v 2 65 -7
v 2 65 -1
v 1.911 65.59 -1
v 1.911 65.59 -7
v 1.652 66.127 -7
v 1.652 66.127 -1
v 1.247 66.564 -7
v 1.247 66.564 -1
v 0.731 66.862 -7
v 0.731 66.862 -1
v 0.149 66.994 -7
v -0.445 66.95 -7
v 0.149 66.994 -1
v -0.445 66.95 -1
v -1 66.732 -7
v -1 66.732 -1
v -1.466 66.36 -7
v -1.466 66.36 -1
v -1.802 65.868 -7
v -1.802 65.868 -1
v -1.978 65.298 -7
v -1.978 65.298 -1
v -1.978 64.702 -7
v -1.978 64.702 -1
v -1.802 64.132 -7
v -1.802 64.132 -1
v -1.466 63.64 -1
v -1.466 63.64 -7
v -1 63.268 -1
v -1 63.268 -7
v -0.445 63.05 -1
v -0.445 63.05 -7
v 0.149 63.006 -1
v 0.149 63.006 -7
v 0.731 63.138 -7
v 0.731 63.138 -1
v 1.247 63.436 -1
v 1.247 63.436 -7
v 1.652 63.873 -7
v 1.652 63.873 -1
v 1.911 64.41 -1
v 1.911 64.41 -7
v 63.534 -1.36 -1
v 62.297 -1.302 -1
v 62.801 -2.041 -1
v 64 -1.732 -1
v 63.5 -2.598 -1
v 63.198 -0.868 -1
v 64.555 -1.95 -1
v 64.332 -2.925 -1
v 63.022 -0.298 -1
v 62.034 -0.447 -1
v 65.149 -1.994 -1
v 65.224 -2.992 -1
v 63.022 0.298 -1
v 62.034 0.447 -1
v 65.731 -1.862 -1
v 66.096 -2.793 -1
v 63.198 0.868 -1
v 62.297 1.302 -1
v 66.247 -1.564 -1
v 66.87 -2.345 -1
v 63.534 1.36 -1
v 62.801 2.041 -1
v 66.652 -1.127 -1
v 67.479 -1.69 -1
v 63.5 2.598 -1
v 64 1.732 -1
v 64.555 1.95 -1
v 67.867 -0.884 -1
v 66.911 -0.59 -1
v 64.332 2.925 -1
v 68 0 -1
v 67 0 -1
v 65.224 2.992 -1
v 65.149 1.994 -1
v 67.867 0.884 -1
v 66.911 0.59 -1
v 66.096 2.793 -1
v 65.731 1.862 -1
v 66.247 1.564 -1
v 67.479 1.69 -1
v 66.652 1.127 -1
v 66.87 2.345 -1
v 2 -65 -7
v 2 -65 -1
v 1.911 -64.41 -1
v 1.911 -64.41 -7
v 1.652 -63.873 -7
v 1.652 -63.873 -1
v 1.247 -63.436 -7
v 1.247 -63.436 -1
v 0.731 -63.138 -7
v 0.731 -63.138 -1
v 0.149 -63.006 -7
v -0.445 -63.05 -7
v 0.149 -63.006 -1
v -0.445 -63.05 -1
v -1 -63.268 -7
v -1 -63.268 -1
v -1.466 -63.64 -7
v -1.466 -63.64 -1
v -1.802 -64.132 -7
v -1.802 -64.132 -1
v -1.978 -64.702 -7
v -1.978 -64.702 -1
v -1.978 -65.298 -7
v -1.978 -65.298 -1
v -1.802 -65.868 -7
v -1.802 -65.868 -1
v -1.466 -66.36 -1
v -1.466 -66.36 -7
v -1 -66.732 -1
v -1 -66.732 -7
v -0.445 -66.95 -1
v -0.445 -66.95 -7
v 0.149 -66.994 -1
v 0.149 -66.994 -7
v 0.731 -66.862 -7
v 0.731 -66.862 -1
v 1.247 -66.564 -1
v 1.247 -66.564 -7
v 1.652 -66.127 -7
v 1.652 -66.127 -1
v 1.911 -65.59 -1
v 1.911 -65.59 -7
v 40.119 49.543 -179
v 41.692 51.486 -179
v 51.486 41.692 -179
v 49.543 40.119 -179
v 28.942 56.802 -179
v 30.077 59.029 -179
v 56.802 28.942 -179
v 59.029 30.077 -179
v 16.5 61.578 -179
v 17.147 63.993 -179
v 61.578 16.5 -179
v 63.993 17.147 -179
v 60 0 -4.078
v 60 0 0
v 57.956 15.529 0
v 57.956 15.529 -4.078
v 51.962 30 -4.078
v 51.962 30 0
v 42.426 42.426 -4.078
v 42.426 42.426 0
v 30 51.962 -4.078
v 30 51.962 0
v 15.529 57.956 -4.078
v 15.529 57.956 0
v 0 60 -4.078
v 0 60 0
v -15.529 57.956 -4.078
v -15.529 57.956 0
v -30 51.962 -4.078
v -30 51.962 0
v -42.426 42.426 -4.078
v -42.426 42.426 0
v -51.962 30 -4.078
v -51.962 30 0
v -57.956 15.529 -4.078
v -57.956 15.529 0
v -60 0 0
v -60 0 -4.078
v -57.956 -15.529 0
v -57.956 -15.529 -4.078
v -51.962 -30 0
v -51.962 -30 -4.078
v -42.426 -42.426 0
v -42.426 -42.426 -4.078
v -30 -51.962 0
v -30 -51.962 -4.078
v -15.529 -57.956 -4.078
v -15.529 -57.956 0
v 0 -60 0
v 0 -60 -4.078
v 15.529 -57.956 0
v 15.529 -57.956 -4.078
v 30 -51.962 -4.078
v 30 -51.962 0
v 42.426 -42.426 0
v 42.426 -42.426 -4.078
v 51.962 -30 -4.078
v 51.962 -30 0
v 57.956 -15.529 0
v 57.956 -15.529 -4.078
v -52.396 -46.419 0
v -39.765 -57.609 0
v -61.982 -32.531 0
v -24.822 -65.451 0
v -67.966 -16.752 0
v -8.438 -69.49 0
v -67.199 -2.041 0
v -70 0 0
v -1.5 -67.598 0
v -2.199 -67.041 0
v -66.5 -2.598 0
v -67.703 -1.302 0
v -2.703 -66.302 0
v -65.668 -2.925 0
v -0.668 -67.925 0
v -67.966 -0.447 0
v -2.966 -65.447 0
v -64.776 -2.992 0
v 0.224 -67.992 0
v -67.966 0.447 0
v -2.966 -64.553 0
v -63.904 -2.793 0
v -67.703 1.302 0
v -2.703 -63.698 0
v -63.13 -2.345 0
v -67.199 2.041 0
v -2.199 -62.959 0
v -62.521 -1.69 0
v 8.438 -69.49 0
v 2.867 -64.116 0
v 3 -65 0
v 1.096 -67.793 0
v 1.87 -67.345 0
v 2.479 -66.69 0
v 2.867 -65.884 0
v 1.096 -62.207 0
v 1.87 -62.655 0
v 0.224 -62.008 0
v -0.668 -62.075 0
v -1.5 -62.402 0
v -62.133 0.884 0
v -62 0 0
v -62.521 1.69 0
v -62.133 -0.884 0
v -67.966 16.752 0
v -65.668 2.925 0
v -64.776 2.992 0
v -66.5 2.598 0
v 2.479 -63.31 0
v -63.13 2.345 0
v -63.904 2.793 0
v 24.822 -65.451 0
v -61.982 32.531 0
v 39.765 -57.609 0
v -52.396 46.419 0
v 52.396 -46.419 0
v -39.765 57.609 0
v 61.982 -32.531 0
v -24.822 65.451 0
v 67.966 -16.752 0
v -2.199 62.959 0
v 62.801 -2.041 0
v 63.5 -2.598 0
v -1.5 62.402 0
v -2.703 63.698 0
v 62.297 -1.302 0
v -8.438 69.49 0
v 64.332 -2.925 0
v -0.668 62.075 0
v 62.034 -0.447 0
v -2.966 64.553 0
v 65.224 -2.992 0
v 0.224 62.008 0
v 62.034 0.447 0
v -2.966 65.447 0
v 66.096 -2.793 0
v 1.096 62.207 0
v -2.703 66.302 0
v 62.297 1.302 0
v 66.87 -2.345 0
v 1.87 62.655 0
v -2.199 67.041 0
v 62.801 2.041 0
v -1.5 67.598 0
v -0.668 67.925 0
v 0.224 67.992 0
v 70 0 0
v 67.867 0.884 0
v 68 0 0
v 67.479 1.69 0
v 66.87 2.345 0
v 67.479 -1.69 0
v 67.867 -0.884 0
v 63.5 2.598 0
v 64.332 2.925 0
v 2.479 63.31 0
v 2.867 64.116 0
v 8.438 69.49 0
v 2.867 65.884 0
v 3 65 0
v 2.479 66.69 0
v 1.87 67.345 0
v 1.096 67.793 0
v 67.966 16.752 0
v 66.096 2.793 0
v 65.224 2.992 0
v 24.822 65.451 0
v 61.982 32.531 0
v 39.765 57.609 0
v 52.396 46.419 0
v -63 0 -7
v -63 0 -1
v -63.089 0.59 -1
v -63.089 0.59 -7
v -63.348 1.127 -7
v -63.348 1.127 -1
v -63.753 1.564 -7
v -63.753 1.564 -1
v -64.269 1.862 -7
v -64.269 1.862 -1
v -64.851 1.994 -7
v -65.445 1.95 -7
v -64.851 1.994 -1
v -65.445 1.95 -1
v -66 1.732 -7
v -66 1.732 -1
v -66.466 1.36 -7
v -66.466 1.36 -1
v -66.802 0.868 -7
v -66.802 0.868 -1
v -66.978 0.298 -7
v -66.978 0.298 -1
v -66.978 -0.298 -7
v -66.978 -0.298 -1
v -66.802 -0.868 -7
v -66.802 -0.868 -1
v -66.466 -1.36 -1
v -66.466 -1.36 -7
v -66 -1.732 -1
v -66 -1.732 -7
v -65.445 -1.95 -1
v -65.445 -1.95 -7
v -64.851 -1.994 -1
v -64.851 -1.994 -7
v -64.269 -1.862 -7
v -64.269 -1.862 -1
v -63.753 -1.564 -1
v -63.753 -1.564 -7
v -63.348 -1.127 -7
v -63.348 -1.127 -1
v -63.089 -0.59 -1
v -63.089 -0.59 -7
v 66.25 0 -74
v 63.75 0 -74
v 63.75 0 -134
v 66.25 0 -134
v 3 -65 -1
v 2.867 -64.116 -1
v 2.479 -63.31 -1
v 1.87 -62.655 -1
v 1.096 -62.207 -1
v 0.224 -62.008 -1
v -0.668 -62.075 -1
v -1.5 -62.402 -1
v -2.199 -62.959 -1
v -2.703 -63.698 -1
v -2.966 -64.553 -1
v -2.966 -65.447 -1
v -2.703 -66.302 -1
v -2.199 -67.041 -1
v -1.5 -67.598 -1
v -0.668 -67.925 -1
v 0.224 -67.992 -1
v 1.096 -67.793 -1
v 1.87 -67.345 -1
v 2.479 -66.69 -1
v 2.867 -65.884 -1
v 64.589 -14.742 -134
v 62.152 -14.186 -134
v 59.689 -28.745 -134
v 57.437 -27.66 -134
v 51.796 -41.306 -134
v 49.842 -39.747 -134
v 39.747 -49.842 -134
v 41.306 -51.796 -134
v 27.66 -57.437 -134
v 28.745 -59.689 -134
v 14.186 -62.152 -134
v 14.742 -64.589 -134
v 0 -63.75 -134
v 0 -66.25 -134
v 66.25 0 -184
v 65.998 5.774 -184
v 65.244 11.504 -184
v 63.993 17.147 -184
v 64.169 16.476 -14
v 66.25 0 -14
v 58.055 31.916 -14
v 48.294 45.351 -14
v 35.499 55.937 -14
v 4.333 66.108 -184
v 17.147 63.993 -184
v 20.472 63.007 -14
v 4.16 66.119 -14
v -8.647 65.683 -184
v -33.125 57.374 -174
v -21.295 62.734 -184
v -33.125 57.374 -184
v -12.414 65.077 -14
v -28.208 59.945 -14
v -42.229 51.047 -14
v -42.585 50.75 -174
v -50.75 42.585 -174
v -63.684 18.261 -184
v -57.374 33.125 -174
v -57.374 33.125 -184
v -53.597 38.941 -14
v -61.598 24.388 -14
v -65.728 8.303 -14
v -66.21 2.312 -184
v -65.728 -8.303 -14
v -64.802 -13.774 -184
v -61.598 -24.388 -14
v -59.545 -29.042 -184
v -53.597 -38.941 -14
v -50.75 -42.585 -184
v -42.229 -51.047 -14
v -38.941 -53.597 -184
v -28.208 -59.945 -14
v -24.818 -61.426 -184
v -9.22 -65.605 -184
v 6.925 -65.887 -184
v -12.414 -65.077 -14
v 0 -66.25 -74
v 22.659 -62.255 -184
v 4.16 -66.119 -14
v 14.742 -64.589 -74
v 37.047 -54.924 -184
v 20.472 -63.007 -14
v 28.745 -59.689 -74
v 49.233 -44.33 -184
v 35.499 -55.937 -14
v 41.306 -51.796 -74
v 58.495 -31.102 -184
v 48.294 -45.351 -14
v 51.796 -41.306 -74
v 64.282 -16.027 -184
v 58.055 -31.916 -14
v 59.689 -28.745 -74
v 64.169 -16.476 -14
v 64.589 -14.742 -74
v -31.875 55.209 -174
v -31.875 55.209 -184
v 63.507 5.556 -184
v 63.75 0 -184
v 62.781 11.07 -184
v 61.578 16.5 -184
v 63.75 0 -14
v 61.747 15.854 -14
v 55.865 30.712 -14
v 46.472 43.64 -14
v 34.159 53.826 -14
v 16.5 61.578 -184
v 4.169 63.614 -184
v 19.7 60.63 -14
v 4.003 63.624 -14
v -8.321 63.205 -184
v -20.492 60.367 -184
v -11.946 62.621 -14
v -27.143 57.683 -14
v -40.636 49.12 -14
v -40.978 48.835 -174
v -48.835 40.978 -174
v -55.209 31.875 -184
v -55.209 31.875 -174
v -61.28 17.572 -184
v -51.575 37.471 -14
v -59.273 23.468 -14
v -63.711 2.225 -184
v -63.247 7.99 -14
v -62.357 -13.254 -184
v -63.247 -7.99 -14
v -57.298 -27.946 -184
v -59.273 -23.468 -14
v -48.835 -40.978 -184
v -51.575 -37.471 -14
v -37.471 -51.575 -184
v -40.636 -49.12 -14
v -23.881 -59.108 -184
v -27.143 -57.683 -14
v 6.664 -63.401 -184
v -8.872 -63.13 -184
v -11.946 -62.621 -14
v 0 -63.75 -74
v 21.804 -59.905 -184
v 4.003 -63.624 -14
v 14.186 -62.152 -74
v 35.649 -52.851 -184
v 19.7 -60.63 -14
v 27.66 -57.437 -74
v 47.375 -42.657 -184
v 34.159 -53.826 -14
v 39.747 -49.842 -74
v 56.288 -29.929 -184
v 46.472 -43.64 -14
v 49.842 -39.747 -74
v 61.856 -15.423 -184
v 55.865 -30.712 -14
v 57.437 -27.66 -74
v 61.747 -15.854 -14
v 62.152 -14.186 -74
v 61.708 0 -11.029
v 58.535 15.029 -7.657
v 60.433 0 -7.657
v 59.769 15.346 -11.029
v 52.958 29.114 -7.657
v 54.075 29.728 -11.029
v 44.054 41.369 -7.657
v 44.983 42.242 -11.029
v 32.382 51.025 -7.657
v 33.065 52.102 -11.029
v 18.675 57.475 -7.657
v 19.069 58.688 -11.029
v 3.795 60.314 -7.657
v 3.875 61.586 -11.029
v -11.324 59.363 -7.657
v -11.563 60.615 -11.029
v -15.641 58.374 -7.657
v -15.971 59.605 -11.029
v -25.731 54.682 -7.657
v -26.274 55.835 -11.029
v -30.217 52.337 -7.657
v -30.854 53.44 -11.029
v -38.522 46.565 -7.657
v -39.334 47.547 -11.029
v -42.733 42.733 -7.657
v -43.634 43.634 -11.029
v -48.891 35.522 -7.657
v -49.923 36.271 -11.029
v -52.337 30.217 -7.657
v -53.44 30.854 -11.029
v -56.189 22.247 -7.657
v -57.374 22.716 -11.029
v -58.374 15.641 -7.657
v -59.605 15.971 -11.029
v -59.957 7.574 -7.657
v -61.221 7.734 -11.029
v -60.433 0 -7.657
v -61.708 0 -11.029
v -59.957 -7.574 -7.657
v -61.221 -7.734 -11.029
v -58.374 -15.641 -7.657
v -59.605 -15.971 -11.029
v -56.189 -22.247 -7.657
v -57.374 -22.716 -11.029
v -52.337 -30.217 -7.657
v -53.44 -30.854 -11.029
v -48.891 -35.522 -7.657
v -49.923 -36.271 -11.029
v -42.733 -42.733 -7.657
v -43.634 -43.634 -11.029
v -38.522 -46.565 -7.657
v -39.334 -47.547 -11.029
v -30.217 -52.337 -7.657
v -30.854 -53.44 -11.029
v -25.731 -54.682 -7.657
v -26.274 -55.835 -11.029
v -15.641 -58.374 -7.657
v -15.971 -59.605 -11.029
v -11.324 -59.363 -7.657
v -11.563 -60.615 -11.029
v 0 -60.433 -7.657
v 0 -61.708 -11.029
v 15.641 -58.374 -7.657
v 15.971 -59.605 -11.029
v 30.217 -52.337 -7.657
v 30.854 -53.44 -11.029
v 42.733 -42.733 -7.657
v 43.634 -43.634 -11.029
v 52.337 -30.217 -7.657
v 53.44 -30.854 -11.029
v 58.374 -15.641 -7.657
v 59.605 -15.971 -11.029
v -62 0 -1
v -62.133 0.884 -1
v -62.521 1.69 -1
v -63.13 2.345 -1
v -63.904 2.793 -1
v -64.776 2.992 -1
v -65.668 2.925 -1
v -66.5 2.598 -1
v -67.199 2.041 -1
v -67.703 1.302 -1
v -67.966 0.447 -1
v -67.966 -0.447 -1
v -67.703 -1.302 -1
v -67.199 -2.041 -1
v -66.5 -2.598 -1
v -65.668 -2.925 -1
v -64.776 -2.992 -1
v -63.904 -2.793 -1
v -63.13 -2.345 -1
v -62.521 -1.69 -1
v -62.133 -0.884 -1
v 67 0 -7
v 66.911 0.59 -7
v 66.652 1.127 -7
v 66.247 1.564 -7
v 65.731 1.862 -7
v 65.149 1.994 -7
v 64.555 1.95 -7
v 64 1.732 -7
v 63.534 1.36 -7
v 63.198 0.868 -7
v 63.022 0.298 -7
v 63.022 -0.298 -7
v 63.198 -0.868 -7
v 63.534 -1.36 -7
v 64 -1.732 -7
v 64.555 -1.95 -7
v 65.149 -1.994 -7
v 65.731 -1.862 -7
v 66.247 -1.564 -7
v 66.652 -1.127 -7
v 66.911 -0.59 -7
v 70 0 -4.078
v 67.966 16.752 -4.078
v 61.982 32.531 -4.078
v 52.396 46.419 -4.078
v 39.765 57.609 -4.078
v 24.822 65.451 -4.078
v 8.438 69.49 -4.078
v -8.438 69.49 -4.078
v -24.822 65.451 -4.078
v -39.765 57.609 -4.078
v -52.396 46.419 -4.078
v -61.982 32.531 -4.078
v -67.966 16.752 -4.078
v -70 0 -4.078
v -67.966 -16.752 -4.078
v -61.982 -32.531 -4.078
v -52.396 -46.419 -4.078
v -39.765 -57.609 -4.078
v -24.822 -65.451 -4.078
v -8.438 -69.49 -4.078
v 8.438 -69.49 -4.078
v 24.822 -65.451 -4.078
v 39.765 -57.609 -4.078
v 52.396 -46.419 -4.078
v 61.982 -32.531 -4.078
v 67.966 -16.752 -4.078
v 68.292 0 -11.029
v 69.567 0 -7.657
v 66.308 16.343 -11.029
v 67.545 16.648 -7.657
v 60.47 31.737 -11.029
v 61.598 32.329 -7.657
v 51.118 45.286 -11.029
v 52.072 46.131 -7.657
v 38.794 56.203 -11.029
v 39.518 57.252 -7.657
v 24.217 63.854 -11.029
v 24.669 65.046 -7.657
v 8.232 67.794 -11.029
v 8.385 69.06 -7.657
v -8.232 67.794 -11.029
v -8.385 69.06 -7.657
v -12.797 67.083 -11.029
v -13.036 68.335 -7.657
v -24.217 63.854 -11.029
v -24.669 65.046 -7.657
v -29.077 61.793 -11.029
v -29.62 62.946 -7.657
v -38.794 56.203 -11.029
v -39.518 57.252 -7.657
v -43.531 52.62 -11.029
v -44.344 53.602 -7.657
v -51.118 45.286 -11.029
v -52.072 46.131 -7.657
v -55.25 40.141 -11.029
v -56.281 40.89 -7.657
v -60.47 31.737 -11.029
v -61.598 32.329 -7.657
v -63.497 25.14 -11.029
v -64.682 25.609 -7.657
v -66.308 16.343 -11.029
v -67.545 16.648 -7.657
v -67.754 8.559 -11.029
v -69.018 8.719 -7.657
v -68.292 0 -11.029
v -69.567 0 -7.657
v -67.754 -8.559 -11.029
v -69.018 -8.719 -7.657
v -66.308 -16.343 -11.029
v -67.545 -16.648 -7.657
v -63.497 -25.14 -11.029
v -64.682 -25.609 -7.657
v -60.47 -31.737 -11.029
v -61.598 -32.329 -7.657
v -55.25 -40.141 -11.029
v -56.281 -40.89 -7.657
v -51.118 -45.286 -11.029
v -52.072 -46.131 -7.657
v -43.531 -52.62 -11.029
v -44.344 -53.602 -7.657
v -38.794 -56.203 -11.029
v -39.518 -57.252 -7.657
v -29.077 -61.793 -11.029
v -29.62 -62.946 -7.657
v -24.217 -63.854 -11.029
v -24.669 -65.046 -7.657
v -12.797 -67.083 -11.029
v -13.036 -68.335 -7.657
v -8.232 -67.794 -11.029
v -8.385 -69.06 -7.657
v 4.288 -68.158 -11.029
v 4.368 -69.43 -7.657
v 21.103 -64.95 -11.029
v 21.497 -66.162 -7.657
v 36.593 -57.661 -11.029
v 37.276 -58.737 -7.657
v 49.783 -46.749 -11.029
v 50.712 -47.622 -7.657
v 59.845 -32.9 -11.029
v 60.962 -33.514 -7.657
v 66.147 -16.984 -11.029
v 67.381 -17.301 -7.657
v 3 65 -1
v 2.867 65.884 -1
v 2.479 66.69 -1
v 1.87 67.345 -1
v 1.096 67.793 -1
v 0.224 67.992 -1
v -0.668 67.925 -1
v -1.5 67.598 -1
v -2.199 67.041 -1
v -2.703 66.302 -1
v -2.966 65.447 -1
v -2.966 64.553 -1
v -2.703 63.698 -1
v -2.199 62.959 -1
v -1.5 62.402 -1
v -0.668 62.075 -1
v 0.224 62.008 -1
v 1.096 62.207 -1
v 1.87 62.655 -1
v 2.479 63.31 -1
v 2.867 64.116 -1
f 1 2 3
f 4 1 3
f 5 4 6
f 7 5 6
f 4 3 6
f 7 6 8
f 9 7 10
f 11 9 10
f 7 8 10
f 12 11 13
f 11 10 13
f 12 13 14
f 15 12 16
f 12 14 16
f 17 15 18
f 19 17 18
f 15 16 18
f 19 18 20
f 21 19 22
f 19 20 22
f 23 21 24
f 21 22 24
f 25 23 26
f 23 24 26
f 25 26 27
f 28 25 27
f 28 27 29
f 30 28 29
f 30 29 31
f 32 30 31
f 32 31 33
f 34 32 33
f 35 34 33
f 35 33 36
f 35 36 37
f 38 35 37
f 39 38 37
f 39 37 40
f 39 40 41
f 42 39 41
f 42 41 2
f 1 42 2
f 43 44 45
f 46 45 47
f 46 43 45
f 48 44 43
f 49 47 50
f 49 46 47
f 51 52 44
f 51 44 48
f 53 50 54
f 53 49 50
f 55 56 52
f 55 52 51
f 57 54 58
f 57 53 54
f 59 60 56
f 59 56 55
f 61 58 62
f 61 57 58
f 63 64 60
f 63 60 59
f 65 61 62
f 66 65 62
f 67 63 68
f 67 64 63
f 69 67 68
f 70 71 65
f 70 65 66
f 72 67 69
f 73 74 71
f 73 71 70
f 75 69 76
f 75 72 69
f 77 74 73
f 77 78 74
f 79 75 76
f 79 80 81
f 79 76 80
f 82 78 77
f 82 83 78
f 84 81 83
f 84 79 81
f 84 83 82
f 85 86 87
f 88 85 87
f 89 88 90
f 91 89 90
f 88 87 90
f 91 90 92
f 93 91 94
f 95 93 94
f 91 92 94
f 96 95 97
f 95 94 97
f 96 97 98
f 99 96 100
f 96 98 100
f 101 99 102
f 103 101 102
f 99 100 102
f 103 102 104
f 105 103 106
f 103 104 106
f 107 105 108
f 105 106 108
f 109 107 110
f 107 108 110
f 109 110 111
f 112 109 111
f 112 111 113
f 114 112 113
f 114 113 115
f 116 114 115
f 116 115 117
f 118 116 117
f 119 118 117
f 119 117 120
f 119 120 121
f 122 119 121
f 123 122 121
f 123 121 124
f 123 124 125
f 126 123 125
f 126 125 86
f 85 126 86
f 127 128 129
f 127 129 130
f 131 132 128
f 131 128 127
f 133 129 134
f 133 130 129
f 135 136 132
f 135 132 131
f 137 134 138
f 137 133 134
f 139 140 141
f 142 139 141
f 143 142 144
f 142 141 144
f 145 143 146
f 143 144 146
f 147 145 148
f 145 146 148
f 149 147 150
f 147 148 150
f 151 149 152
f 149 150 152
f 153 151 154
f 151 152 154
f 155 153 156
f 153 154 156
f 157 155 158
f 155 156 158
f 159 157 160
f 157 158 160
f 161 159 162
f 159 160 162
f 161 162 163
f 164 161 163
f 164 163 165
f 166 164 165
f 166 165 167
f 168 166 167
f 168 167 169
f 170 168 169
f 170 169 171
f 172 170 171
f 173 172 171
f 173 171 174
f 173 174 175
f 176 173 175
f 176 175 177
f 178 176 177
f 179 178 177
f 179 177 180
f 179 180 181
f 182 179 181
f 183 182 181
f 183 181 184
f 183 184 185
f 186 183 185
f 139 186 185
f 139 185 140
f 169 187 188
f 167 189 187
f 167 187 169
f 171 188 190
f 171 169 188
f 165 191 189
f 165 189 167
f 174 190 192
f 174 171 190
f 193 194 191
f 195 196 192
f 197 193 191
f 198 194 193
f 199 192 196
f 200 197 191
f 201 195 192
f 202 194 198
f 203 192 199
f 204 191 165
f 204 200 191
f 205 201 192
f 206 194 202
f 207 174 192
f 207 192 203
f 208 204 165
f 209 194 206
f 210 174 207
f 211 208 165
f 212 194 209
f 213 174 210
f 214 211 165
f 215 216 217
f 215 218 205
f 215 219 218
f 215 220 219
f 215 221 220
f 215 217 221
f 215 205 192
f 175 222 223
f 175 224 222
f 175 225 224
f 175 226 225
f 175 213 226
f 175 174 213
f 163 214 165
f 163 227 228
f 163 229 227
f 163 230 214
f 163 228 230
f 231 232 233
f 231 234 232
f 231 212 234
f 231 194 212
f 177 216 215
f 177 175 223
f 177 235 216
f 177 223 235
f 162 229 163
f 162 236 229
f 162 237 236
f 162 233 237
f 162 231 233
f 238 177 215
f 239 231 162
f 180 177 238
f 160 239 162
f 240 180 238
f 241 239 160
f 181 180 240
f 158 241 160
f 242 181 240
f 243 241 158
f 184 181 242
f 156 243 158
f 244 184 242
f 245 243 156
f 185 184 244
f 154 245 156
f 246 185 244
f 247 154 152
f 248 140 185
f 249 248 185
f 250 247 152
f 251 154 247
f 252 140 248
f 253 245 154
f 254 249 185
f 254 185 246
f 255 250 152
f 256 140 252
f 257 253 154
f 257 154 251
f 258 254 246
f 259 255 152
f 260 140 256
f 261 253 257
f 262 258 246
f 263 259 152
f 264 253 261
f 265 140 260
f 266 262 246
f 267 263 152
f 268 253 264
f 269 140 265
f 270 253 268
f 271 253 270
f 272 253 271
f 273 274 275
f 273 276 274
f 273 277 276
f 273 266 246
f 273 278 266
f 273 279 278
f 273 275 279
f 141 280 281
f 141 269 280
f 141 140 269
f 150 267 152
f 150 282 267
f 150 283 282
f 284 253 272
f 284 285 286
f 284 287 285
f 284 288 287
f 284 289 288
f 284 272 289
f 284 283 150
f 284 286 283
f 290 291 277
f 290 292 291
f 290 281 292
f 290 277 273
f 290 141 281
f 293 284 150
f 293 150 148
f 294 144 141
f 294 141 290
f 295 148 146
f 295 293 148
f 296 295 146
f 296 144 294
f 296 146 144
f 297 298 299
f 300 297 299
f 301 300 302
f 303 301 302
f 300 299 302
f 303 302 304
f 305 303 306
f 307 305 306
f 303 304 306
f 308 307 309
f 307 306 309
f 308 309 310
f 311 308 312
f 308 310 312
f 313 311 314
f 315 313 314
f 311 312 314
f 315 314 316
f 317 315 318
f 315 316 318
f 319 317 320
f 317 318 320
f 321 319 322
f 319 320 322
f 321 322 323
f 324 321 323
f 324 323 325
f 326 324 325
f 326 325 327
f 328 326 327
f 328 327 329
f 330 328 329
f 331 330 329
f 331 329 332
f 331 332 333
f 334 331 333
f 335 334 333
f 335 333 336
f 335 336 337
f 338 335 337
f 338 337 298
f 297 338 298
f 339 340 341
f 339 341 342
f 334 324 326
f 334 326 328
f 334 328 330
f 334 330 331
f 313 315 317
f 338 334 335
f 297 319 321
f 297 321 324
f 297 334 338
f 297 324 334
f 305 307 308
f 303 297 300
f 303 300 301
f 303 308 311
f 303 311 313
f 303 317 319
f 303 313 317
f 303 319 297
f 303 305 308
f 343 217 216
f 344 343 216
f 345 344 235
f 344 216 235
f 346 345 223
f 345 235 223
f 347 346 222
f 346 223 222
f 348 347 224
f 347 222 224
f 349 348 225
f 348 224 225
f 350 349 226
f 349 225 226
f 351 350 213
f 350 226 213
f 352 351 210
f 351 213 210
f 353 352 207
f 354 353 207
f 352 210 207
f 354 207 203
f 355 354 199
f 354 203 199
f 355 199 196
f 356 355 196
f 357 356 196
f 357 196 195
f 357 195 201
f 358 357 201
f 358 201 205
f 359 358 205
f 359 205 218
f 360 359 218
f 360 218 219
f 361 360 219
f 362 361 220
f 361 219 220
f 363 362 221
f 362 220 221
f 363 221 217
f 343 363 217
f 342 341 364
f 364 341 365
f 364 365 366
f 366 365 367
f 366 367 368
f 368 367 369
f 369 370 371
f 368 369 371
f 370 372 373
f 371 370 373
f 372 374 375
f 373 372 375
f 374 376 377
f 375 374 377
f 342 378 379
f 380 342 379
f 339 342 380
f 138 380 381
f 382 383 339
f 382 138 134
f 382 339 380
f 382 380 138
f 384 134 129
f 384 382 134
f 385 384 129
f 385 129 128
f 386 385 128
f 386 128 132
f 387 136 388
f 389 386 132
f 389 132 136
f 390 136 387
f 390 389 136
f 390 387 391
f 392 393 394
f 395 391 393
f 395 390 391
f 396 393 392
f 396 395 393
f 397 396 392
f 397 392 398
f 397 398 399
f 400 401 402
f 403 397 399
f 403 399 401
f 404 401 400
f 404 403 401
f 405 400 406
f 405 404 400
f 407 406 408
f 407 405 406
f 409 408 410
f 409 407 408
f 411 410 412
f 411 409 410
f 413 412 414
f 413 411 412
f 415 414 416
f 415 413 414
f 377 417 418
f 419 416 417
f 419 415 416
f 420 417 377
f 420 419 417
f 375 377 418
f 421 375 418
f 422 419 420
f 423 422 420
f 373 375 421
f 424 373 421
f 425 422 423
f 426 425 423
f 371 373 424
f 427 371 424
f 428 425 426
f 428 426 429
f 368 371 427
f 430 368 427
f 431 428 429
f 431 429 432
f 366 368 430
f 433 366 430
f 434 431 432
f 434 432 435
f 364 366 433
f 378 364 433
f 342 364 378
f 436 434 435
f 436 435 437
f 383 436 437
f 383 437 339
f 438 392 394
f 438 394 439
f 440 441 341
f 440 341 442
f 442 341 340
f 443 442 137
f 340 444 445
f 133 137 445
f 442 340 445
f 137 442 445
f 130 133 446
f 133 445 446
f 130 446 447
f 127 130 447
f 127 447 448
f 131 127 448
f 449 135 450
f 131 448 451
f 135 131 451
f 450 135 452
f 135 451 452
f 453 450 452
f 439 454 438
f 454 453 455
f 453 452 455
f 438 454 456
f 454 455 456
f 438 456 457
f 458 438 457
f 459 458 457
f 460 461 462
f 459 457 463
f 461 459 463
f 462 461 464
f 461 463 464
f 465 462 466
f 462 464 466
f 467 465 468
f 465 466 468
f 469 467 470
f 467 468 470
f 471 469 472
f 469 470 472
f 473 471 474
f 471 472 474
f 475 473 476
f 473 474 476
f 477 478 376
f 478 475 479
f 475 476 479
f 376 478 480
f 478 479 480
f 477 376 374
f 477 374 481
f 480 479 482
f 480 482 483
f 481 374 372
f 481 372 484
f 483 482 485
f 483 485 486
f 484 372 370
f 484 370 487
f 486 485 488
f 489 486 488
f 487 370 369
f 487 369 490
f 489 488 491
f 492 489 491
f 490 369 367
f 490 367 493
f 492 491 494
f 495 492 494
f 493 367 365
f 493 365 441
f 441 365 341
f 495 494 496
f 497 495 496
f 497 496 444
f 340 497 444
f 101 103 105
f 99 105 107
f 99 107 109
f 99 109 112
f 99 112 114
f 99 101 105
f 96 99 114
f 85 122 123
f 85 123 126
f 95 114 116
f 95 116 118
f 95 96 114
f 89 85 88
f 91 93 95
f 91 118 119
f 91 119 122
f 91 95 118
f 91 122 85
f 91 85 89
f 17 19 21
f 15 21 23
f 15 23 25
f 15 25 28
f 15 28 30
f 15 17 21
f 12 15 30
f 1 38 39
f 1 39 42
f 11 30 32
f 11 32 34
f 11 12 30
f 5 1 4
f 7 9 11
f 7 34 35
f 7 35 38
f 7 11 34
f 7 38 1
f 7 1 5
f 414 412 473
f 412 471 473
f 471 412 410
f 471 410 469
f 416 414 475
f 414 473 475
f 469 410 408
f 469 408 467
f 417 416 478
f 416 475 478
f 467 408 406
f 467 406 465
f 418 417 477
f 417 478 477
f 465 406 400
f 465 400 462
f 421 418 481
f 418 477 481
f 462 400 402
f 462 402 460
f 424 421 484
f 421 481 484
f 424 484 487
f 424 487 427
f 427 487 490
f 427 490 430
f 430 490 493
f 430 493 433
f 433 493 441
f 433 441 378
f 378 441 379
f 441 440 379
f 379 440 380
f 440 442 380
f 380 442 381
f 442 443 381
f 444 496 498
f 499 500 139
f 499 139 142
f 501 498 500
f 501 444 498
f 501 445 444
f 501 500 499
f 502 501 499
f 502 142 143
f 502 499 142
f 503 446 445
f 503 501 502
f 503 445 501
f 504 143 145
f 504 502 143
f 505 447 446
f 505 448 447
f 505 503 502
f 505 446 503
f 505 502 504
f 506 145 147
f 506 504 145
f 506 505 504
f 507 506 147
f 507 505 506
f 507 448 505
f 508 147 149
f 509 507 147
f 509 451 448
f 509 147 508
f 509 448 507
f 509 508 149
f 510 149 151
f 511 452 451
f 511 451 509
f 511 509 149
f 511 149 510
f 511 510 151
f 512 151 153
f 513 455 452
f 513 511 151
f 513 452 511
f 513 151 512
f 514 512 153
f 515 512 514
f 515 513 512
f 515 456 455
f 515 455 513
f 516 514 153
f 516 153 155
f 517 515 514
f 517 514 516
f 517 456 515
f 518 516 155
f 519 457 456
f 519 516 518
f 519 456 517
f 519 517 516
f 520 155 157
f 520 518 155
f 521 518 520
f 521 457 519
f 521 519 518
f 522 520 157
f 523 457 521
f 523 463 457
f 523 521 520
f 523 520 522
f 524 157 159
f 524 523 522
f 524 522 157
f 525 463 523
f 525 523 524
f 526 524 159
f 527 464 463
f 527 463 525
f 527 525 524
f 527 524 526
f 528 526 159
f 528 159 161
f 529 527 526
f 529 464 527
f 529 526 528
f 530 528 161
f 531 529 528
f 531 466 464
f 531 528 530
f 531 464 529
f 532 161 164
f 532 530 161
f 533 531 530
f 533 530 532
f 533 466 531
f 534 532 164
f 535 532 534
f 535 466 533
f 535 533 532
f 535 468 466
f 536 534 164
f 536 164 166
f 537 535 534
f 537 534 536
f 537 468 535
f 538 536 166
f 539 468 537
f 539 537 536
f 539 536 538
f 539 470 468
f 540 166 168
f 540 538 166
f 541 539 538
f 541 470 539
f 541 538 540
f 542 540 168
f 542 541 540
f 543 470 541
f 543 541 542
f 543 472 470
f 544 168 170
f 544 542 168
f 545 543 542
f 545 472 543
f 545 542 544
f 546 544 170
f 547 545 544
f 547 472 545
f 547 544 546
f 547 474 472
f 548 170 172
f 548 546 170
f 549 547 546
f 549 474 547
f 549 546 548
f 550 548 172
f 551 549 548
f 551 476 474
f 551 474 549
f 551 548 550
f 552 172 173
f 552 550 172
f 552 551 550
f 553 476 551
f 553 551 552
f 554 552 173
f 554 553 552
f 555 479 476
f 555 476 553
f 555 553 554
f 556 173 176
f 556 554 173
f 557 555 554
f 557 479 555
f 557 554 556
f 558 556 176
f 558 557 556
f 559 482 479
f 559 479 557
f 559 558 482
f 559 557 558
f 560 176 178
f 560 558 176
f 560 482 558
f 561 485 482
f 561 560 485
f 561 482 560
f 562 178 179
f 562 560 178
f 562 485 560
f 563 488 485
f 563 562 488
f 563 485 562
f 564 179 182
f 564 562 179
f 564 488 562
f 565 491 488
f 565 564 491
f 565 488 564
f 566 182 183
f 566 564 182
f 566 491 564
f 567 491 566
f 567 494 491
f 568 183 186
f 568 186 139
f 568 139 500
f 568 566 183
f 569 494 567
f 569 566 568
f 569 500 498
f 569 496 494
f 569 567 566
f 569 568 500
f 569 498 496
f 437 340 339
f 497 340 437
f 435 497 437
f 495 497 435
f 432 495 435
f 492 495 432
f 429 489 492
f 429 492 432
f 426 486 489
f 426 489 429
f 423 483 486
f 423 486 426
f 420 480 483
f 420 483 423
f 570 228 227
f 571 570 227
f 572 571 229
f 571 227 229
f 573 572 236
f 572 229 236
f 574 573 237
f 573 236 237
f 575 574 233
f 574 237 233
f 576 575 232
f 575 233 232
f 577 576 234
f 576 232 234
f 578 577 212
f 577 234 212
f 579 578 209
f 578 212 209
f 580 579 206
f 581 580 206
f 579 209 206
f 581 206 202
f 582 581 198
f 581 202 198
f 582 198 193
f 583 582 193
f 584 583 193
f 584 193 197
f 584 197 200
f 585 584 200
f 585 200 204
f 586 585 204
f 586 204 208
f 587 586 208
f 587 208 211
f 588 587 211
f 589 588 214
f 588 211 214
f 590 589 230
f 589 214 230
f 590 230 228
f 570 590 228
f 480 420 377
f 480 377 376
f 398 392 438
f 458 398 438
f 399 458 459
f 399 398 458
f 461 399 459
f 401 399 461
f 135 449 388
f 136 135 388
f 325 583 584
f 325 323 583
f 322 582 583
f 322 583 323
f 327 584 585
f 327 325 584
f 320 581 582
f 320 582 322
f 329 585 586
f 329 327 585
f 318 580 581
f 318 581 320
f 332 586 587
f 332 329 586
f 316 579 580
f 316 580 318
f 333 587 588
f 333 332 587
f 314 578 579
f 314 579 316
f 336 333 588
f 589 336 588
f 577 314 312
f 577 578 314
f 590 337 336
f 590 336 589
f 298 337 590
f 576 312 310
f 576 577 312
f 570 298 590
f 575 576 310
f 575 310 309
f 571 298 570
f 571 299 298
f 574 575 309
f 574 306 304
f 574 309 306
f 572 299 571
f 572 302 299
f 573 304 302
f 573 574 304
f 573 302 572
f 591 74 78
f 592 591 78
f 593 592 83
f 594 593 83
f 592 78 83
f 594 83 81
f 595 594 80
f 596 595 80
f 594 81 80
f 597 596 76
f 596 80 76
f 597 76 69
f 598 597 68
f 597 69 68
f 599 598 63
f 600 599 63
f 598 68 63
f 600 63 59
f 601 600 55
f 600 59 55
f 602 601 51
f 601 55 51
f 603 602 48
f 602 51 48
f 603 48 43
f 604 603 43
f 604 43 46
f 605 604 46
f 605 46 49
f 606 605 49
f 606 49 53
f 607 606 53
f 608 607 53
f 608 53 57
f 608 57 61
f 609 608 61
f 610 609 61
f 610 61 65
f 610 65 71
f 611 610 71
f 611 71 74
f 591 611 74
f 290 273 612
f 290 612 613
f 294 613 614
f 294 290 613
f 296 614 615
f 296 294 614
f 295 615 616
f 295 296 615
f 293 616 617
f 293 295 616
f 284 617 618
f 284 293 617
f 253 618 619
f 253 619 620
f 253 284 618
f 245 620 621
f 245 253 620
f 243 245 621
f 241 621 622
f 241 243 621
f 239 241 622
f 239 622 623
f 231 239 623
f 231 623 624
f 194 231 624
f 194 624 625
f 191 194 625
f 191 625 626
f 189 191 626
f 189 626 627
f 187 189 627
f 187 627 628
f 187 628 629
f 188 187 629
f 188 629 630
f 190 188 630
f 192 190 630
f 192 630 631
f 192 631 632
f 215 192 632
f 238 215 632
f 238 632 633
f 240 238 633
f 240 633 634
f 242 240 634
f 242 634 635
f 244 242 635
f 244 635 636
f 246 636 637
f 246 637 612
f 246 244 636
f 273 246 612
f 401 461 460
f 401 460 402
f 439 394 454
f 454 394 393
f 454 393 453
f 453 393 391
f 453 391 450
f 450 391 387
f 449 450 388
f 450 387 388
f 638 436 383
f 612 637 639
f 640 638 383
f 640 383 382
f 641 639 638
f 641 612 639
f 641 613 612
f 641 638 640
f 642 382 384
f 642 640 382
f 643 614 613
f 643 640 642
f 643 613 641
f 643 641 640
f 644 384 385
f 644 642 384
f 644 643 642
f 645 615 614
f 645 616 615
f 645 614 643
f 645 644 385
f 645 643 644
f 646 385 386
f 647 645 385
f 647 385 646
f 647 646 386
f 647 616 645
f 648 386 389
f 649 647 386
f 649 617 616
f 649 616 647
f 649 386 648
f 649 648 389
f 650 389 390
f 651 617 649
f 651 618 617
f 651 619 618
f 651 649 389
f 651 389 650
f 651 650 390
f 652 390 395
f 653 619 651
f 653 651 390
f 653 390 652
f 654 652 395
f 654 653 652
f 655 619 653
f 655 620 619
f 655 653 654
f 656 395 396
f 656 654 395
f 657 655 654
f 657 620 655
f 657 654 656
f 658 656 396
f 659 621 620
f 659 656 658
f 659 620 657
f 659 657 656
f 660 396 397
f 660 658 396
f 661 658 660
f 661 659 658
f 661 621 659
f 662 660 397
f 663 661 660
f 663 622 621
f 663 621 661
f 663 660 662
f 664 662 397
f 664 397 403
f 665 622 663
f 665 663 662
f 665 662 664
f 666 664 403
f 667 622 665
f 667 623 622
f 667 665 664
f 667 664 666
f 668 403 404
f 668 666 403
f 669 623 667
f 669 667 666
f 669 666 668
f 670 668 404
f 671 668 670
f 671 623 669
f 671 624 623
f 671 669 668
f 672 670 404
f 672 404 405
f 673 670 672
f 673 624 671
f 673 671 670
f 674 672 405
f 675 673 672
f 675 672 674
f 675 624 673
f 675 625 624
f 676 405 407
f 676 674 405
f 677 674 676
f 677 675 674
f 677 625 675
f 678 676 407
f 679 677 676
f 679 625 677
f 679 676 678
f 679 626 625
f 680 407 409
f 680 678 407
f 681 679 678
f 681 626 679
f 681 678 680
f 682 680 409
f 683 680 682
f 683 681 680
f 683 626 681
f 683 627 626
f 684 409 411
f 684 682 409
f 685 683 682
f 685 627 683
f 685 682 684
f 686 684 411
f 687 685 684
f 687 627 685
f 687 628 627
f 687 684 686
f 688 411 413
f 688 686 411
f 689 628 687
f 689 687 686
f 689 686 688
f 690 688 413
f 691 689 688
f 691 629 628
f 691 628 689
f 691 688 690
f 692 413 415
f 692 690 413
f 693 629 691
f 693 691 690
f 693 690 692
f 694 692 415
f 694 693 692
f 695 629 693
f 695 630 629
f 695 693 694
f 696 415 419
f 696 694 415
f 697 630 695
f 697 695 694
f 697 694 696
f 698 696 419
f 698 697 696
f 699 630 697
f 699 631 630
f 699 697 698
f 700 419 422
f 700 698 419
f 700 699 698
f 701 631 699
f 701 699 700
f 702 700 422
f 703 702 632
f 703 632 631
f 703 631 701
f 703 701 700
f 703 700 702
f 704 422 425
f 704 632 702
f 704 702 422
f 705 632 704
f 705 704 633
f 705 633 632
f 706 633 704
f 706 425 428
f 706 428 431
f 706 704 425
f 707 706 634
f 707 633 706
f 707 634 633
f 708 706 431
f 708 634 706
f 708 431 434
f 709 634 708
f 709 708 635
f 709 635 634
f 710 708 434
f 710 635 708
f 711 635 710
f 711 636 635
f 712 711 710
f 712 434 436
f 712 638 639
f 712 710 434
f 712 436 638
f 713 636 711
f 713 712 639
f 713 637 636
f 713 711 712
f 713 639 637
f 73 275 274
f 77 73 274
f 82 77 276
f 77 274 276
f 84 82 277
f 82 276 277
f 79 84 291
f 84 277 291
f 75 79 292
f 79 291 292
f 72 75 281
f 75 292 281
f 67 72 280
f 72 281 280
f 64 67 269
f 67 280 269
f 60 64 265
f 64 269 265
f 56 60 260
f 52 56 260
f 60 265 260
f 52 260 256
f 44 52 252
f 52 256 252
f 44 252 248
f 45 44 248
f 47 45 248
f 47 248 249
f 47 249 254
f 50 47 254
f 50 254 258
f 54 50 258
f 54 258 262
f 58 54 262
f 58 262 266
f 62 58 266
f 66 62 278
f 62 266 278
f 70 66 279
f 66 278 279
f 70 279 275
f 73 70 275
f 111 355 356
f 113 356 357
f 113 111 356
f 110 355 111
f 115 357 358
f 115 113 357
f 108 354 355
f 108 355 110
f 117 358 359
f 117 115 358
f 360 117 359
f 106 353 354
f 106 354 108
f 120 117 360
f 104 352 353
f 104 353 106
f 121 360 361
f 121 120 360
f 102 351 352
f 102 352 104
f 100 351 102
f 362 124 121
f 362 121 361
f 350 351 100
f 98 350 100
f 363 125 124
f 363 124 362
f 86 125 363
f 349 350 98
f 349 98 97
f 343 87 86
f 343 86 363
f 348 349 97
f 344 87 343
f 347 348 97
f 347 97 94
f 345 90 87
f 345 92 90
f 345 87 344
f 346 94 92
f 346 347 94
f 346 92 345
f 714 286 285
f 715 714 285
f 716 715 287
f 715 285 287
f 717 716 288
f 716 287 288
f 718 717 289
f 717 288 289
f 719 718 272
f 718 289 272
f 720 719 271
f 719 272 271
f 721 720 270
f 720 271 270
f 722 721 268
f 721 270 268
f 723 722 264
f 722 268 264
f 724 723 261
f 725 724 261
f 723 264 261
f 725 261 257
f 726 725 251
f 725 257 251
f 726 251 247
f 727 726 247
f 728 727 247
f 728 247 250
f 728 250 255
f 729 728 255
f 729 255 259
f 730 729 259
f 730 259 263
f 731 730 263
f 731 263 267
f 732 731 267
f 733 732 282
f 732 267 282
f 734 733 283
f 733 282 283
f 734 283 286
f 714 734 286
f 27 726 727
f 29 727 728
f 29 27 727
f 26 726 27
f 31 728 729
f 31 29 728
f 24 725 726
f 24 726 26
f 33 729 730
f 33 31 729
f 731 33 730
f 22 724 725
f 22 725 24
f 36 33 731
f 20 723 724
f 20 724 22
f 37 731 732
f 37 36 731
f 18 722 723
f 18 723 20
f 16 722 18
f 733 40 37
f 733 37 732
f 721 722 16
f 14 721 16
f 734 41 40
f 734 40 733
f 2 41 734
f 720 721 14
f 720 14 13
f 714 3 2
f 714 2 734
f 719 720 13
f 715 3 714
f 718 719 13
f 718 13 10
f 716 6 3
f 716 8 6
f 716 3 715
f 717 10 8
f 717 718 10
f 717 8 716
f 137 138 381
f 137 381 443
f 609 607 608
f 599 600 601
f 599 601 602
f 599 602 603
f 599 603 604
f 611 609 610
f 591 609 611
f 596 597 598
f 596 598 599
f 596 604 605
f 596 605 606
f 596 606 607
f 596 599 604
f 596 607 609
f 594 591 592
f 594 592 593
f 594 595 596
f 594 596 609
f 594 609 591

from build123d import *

# Parameters (mm, degrees)
SKIZZE1_R                       = 70
SKIZZE1_R_2                     = 60
AUFSATZ_LINEAR_AUSTRAGEN1_DEPTH = 14
AUFSATZ_LINEAR_START            = -14
SKIZZE10_R                      = 66.25
SKIZZE10_R_2                    = 63.75
AUFSATZ_LINEAR_AUSTRAGEN2_DEPTH = 170
SCHNITT_LINEAR_START            = -74
SCHNITT_LINEAR_AUSTRAGEN1_DEPTH = 60
SCHNITT_LINEAR_START_2          = -174
SCHNITT_LINEAR_AUSTRAGEN3_DEPTH = 10
SCHNITT_LINEAR_START_3          = -179
SCHNITT_LINEAR_AUSTRAGEN4_DEPTH = 5
SKIZZE3_R                       = 2
SCHNITT_LINEAR_AUSTRAGEN5_DEPTH = 7
SKIZZE9_R                       = 3
SCHNITT_LINEAR_AUSTRAGEN6_DEPTH = 1
VERRUNDUNG4_R                   = 15
VERRUNDUNG5_R                   = 15


with BuildPart() as part:
    # Skizze1 → Aufsatz-Linear austragen1 (new body)
    with BuildSketch(Plane(origin=(0, 0, 0), x_dir=(0, 1, 0), z_dir=(0, 0, 1))):
        with Locations(Location((0, 0, 0), (0, 0, 270))):
            Circle(SKIZZE1_R)
        with Locations(Location((0, 0, 0), (0, 0, 270))):
            Circle(SKIZZE1_R_2, mode=Mode.SUBTRACT)
    extrude(amount=-AUFSATZ_LINEAR_AUSTRAGEN1_DEPTH)

    # Skizze10 → Aufsatz-Linear austragen2 (add)
    with BuildSketch(Plane.XY.offset(AUFSATZ_LINEAR_START)):
        Circle(SKIZZE10_R)
        Circle(SKIZZE10_R_2, mode=Mode.SUBTRACT)
    extrude(amount=-AUFSATZ_LINEAR_AUSTRAGEN2_DEPTH)

    # Skizze4 → Schnitt-Linear austragen1 (cut)
    with BuildSketch(Plane(origin=(0, 0, 0), x_dir=(0, 1, 0), z_dir=(0, 0, 1)).offset(SCHNITT_LINEAR_START)):
        with BuildLine():
            Line((-70, 0), (-60, 0))
            ThreePointArc((-60, 0), (-42.426406871, -42.426406871), (0, -60))
            Line((0, -60), (0, -70))
            ThreePointArc((0, -70), (-49.497474683, -49.497474683), (-70, 0))
        make_face()
    extrude(amount=-SCHNITT_LINEAR_AUSTRAGEN1_DEPTH, mode=Mode.SUBTRACT)

    # Skizze5 → Schnitt-Linear austragen3 (cut)
    with BuildSketch(Plane(origin=(0, 0, 0), x_dir=(0, 1, 0), z_dir=(0, 0, 1)).offset(SCHNITT_LINEAR_START_2)):
        with BuildLine():
            Line((30, 51.961524227), (35, 60.621778265))
            ThreePointArc((35, 60.621778265), (49.497474683, 49.497474683), (60.621778265, 35))
            Line((60.621778265, 35), (51.961524227, 30))
            ThreePointArc((51.961524227, 30), (42.426406871, 42.426406871), (30, 51.961524227))
        make_face()
    extrude(amount=-SCHNITT_LINEAR_AUSTRAGEN3_DEPTH, mode=Mode.SUBTRACT)

    # Skizze6 → Schnitt-Linear austragen4 (cut)
    with BuildSketch(Plane(origin=(0, 0, 0), x_dir=(0, 1, 0), z_dir=(0, 0, 1)).offset(SCHNITT_LINEAR_START_3)):
        with BuildLine():
            Line((57.955549577, -15.529142706), (67.61480784, -18.117333157))
            ThreePointArc((67.61480784, -18.117333157), (49.497474683, -49.497474683), (18.117333157, -67.61480784))
            Line((18.117333157, -67.61480784), (15.529142706, -57.955549577))
            ThreePointArc((15.529142706, -57.955549577), (42.426406871, -42.426406871), (57.955549577, -15.529142706))
        make_face()
    extrude(amount=-SCHNITT_LINEAR_AUSTRAGEN4_DEPTH, mode=Mode.SUBTRACT)

    # Skizze3 → Schnitt-Linear austragen5 (cut)
    with BuildSketch(Plane(origin=(0, 0, 0), x_dir=(0, 1, 0), z_dir=(0, 0, 1))):
        with Locations(Location((-65, 0, 0), (0, 0, 270))):
            Circle(SKIZZE3_R)
        with Locations(Location((0, 65, 0), (0, 0, 270))):
            Circle(SKIZZE3_R)
        with Locations(Location((65, 0, 0), (0, 0, 270))):
            Circle(SKIZZE3_R)
        with Locations(Location((0, -65, 0), (0, 0, 270))):
            Circle(SKIZZE3_R)
    extrude(amount=-SCHNITT_LINEAR_AUSTRAGEN5_DEPTH, mode=Mode.SUBTRACT)

    # Skizze9 → Schnitt-Linear austragen6 (cut)
    with BuildSketch(Plane(origin=(0, 0, 0), x_dir=(0, 1, 0), z_dir=(0, 0, 1))):
        with Locations(Location((0, 65, 0), (0, 0, 270))):
            Circle(SKIZZE9_R)
        with Locations(Location((65, 0, 0), (0, 0, 270))):
            Circle(SKIZZE9_R)
        with Locations(Location((0, -65, 0), (0, 0, 270))):
            Circle(SKIZZE9_R)
        with Locations(Location((-65, 0, 0), (0, 0, 270))):
            Circle(SKIZZE9_R)
    extrude(amount=-SCHNITT_LINEAR_AUSTRAGEN6_DEPTH, mode=Mode.SUBTRACT)

    # Verrundung4
    # the kernel refuses this fillet: 15 mm, written as the material it takes off along each edge
    with BuildSketch(Plane(origin=(0, 0, -14), x_dir=(1, 0, 0), z_dir=(0, -1, 0))) as verrundung4_piece_1:
        with BuildLine():
            CenterArc((75, 9.921567416), VERRUNDUNG4_R, 180, 41.409622109)
            Line((63.75, 0), (60, 0))
            Line((60, 0), (60, 9.921567416))
        make_face()
    revolve(axis=Axis((0, 0, -14), (0, 0, 1)), mode=Mode.SUBTRACT)

    # Verrundung5
    # the kernel refuses this fillet: 15 mm, written as the material it takes off along each edge
    with BuildSketch(Plane(origin=(0, 0, -14), x_dir=(1, 0, 0), z_dir=(0, -1, 0))) as verrundung5_piece_1:
        with BuildLine():
            CenterArc((55, 9.921567416), VERRUNDUNG5_R, 318.590377891, 41.409622109)
            Line((66.25, 0), (70, 0))
            Line((70, 0), (70, 9.921567416))
        make_face()
    revolve(axis=Axis((0, 0, -14), (0, 0, 1)), mode=Mode.SUBTRACT)


solid = part.part
